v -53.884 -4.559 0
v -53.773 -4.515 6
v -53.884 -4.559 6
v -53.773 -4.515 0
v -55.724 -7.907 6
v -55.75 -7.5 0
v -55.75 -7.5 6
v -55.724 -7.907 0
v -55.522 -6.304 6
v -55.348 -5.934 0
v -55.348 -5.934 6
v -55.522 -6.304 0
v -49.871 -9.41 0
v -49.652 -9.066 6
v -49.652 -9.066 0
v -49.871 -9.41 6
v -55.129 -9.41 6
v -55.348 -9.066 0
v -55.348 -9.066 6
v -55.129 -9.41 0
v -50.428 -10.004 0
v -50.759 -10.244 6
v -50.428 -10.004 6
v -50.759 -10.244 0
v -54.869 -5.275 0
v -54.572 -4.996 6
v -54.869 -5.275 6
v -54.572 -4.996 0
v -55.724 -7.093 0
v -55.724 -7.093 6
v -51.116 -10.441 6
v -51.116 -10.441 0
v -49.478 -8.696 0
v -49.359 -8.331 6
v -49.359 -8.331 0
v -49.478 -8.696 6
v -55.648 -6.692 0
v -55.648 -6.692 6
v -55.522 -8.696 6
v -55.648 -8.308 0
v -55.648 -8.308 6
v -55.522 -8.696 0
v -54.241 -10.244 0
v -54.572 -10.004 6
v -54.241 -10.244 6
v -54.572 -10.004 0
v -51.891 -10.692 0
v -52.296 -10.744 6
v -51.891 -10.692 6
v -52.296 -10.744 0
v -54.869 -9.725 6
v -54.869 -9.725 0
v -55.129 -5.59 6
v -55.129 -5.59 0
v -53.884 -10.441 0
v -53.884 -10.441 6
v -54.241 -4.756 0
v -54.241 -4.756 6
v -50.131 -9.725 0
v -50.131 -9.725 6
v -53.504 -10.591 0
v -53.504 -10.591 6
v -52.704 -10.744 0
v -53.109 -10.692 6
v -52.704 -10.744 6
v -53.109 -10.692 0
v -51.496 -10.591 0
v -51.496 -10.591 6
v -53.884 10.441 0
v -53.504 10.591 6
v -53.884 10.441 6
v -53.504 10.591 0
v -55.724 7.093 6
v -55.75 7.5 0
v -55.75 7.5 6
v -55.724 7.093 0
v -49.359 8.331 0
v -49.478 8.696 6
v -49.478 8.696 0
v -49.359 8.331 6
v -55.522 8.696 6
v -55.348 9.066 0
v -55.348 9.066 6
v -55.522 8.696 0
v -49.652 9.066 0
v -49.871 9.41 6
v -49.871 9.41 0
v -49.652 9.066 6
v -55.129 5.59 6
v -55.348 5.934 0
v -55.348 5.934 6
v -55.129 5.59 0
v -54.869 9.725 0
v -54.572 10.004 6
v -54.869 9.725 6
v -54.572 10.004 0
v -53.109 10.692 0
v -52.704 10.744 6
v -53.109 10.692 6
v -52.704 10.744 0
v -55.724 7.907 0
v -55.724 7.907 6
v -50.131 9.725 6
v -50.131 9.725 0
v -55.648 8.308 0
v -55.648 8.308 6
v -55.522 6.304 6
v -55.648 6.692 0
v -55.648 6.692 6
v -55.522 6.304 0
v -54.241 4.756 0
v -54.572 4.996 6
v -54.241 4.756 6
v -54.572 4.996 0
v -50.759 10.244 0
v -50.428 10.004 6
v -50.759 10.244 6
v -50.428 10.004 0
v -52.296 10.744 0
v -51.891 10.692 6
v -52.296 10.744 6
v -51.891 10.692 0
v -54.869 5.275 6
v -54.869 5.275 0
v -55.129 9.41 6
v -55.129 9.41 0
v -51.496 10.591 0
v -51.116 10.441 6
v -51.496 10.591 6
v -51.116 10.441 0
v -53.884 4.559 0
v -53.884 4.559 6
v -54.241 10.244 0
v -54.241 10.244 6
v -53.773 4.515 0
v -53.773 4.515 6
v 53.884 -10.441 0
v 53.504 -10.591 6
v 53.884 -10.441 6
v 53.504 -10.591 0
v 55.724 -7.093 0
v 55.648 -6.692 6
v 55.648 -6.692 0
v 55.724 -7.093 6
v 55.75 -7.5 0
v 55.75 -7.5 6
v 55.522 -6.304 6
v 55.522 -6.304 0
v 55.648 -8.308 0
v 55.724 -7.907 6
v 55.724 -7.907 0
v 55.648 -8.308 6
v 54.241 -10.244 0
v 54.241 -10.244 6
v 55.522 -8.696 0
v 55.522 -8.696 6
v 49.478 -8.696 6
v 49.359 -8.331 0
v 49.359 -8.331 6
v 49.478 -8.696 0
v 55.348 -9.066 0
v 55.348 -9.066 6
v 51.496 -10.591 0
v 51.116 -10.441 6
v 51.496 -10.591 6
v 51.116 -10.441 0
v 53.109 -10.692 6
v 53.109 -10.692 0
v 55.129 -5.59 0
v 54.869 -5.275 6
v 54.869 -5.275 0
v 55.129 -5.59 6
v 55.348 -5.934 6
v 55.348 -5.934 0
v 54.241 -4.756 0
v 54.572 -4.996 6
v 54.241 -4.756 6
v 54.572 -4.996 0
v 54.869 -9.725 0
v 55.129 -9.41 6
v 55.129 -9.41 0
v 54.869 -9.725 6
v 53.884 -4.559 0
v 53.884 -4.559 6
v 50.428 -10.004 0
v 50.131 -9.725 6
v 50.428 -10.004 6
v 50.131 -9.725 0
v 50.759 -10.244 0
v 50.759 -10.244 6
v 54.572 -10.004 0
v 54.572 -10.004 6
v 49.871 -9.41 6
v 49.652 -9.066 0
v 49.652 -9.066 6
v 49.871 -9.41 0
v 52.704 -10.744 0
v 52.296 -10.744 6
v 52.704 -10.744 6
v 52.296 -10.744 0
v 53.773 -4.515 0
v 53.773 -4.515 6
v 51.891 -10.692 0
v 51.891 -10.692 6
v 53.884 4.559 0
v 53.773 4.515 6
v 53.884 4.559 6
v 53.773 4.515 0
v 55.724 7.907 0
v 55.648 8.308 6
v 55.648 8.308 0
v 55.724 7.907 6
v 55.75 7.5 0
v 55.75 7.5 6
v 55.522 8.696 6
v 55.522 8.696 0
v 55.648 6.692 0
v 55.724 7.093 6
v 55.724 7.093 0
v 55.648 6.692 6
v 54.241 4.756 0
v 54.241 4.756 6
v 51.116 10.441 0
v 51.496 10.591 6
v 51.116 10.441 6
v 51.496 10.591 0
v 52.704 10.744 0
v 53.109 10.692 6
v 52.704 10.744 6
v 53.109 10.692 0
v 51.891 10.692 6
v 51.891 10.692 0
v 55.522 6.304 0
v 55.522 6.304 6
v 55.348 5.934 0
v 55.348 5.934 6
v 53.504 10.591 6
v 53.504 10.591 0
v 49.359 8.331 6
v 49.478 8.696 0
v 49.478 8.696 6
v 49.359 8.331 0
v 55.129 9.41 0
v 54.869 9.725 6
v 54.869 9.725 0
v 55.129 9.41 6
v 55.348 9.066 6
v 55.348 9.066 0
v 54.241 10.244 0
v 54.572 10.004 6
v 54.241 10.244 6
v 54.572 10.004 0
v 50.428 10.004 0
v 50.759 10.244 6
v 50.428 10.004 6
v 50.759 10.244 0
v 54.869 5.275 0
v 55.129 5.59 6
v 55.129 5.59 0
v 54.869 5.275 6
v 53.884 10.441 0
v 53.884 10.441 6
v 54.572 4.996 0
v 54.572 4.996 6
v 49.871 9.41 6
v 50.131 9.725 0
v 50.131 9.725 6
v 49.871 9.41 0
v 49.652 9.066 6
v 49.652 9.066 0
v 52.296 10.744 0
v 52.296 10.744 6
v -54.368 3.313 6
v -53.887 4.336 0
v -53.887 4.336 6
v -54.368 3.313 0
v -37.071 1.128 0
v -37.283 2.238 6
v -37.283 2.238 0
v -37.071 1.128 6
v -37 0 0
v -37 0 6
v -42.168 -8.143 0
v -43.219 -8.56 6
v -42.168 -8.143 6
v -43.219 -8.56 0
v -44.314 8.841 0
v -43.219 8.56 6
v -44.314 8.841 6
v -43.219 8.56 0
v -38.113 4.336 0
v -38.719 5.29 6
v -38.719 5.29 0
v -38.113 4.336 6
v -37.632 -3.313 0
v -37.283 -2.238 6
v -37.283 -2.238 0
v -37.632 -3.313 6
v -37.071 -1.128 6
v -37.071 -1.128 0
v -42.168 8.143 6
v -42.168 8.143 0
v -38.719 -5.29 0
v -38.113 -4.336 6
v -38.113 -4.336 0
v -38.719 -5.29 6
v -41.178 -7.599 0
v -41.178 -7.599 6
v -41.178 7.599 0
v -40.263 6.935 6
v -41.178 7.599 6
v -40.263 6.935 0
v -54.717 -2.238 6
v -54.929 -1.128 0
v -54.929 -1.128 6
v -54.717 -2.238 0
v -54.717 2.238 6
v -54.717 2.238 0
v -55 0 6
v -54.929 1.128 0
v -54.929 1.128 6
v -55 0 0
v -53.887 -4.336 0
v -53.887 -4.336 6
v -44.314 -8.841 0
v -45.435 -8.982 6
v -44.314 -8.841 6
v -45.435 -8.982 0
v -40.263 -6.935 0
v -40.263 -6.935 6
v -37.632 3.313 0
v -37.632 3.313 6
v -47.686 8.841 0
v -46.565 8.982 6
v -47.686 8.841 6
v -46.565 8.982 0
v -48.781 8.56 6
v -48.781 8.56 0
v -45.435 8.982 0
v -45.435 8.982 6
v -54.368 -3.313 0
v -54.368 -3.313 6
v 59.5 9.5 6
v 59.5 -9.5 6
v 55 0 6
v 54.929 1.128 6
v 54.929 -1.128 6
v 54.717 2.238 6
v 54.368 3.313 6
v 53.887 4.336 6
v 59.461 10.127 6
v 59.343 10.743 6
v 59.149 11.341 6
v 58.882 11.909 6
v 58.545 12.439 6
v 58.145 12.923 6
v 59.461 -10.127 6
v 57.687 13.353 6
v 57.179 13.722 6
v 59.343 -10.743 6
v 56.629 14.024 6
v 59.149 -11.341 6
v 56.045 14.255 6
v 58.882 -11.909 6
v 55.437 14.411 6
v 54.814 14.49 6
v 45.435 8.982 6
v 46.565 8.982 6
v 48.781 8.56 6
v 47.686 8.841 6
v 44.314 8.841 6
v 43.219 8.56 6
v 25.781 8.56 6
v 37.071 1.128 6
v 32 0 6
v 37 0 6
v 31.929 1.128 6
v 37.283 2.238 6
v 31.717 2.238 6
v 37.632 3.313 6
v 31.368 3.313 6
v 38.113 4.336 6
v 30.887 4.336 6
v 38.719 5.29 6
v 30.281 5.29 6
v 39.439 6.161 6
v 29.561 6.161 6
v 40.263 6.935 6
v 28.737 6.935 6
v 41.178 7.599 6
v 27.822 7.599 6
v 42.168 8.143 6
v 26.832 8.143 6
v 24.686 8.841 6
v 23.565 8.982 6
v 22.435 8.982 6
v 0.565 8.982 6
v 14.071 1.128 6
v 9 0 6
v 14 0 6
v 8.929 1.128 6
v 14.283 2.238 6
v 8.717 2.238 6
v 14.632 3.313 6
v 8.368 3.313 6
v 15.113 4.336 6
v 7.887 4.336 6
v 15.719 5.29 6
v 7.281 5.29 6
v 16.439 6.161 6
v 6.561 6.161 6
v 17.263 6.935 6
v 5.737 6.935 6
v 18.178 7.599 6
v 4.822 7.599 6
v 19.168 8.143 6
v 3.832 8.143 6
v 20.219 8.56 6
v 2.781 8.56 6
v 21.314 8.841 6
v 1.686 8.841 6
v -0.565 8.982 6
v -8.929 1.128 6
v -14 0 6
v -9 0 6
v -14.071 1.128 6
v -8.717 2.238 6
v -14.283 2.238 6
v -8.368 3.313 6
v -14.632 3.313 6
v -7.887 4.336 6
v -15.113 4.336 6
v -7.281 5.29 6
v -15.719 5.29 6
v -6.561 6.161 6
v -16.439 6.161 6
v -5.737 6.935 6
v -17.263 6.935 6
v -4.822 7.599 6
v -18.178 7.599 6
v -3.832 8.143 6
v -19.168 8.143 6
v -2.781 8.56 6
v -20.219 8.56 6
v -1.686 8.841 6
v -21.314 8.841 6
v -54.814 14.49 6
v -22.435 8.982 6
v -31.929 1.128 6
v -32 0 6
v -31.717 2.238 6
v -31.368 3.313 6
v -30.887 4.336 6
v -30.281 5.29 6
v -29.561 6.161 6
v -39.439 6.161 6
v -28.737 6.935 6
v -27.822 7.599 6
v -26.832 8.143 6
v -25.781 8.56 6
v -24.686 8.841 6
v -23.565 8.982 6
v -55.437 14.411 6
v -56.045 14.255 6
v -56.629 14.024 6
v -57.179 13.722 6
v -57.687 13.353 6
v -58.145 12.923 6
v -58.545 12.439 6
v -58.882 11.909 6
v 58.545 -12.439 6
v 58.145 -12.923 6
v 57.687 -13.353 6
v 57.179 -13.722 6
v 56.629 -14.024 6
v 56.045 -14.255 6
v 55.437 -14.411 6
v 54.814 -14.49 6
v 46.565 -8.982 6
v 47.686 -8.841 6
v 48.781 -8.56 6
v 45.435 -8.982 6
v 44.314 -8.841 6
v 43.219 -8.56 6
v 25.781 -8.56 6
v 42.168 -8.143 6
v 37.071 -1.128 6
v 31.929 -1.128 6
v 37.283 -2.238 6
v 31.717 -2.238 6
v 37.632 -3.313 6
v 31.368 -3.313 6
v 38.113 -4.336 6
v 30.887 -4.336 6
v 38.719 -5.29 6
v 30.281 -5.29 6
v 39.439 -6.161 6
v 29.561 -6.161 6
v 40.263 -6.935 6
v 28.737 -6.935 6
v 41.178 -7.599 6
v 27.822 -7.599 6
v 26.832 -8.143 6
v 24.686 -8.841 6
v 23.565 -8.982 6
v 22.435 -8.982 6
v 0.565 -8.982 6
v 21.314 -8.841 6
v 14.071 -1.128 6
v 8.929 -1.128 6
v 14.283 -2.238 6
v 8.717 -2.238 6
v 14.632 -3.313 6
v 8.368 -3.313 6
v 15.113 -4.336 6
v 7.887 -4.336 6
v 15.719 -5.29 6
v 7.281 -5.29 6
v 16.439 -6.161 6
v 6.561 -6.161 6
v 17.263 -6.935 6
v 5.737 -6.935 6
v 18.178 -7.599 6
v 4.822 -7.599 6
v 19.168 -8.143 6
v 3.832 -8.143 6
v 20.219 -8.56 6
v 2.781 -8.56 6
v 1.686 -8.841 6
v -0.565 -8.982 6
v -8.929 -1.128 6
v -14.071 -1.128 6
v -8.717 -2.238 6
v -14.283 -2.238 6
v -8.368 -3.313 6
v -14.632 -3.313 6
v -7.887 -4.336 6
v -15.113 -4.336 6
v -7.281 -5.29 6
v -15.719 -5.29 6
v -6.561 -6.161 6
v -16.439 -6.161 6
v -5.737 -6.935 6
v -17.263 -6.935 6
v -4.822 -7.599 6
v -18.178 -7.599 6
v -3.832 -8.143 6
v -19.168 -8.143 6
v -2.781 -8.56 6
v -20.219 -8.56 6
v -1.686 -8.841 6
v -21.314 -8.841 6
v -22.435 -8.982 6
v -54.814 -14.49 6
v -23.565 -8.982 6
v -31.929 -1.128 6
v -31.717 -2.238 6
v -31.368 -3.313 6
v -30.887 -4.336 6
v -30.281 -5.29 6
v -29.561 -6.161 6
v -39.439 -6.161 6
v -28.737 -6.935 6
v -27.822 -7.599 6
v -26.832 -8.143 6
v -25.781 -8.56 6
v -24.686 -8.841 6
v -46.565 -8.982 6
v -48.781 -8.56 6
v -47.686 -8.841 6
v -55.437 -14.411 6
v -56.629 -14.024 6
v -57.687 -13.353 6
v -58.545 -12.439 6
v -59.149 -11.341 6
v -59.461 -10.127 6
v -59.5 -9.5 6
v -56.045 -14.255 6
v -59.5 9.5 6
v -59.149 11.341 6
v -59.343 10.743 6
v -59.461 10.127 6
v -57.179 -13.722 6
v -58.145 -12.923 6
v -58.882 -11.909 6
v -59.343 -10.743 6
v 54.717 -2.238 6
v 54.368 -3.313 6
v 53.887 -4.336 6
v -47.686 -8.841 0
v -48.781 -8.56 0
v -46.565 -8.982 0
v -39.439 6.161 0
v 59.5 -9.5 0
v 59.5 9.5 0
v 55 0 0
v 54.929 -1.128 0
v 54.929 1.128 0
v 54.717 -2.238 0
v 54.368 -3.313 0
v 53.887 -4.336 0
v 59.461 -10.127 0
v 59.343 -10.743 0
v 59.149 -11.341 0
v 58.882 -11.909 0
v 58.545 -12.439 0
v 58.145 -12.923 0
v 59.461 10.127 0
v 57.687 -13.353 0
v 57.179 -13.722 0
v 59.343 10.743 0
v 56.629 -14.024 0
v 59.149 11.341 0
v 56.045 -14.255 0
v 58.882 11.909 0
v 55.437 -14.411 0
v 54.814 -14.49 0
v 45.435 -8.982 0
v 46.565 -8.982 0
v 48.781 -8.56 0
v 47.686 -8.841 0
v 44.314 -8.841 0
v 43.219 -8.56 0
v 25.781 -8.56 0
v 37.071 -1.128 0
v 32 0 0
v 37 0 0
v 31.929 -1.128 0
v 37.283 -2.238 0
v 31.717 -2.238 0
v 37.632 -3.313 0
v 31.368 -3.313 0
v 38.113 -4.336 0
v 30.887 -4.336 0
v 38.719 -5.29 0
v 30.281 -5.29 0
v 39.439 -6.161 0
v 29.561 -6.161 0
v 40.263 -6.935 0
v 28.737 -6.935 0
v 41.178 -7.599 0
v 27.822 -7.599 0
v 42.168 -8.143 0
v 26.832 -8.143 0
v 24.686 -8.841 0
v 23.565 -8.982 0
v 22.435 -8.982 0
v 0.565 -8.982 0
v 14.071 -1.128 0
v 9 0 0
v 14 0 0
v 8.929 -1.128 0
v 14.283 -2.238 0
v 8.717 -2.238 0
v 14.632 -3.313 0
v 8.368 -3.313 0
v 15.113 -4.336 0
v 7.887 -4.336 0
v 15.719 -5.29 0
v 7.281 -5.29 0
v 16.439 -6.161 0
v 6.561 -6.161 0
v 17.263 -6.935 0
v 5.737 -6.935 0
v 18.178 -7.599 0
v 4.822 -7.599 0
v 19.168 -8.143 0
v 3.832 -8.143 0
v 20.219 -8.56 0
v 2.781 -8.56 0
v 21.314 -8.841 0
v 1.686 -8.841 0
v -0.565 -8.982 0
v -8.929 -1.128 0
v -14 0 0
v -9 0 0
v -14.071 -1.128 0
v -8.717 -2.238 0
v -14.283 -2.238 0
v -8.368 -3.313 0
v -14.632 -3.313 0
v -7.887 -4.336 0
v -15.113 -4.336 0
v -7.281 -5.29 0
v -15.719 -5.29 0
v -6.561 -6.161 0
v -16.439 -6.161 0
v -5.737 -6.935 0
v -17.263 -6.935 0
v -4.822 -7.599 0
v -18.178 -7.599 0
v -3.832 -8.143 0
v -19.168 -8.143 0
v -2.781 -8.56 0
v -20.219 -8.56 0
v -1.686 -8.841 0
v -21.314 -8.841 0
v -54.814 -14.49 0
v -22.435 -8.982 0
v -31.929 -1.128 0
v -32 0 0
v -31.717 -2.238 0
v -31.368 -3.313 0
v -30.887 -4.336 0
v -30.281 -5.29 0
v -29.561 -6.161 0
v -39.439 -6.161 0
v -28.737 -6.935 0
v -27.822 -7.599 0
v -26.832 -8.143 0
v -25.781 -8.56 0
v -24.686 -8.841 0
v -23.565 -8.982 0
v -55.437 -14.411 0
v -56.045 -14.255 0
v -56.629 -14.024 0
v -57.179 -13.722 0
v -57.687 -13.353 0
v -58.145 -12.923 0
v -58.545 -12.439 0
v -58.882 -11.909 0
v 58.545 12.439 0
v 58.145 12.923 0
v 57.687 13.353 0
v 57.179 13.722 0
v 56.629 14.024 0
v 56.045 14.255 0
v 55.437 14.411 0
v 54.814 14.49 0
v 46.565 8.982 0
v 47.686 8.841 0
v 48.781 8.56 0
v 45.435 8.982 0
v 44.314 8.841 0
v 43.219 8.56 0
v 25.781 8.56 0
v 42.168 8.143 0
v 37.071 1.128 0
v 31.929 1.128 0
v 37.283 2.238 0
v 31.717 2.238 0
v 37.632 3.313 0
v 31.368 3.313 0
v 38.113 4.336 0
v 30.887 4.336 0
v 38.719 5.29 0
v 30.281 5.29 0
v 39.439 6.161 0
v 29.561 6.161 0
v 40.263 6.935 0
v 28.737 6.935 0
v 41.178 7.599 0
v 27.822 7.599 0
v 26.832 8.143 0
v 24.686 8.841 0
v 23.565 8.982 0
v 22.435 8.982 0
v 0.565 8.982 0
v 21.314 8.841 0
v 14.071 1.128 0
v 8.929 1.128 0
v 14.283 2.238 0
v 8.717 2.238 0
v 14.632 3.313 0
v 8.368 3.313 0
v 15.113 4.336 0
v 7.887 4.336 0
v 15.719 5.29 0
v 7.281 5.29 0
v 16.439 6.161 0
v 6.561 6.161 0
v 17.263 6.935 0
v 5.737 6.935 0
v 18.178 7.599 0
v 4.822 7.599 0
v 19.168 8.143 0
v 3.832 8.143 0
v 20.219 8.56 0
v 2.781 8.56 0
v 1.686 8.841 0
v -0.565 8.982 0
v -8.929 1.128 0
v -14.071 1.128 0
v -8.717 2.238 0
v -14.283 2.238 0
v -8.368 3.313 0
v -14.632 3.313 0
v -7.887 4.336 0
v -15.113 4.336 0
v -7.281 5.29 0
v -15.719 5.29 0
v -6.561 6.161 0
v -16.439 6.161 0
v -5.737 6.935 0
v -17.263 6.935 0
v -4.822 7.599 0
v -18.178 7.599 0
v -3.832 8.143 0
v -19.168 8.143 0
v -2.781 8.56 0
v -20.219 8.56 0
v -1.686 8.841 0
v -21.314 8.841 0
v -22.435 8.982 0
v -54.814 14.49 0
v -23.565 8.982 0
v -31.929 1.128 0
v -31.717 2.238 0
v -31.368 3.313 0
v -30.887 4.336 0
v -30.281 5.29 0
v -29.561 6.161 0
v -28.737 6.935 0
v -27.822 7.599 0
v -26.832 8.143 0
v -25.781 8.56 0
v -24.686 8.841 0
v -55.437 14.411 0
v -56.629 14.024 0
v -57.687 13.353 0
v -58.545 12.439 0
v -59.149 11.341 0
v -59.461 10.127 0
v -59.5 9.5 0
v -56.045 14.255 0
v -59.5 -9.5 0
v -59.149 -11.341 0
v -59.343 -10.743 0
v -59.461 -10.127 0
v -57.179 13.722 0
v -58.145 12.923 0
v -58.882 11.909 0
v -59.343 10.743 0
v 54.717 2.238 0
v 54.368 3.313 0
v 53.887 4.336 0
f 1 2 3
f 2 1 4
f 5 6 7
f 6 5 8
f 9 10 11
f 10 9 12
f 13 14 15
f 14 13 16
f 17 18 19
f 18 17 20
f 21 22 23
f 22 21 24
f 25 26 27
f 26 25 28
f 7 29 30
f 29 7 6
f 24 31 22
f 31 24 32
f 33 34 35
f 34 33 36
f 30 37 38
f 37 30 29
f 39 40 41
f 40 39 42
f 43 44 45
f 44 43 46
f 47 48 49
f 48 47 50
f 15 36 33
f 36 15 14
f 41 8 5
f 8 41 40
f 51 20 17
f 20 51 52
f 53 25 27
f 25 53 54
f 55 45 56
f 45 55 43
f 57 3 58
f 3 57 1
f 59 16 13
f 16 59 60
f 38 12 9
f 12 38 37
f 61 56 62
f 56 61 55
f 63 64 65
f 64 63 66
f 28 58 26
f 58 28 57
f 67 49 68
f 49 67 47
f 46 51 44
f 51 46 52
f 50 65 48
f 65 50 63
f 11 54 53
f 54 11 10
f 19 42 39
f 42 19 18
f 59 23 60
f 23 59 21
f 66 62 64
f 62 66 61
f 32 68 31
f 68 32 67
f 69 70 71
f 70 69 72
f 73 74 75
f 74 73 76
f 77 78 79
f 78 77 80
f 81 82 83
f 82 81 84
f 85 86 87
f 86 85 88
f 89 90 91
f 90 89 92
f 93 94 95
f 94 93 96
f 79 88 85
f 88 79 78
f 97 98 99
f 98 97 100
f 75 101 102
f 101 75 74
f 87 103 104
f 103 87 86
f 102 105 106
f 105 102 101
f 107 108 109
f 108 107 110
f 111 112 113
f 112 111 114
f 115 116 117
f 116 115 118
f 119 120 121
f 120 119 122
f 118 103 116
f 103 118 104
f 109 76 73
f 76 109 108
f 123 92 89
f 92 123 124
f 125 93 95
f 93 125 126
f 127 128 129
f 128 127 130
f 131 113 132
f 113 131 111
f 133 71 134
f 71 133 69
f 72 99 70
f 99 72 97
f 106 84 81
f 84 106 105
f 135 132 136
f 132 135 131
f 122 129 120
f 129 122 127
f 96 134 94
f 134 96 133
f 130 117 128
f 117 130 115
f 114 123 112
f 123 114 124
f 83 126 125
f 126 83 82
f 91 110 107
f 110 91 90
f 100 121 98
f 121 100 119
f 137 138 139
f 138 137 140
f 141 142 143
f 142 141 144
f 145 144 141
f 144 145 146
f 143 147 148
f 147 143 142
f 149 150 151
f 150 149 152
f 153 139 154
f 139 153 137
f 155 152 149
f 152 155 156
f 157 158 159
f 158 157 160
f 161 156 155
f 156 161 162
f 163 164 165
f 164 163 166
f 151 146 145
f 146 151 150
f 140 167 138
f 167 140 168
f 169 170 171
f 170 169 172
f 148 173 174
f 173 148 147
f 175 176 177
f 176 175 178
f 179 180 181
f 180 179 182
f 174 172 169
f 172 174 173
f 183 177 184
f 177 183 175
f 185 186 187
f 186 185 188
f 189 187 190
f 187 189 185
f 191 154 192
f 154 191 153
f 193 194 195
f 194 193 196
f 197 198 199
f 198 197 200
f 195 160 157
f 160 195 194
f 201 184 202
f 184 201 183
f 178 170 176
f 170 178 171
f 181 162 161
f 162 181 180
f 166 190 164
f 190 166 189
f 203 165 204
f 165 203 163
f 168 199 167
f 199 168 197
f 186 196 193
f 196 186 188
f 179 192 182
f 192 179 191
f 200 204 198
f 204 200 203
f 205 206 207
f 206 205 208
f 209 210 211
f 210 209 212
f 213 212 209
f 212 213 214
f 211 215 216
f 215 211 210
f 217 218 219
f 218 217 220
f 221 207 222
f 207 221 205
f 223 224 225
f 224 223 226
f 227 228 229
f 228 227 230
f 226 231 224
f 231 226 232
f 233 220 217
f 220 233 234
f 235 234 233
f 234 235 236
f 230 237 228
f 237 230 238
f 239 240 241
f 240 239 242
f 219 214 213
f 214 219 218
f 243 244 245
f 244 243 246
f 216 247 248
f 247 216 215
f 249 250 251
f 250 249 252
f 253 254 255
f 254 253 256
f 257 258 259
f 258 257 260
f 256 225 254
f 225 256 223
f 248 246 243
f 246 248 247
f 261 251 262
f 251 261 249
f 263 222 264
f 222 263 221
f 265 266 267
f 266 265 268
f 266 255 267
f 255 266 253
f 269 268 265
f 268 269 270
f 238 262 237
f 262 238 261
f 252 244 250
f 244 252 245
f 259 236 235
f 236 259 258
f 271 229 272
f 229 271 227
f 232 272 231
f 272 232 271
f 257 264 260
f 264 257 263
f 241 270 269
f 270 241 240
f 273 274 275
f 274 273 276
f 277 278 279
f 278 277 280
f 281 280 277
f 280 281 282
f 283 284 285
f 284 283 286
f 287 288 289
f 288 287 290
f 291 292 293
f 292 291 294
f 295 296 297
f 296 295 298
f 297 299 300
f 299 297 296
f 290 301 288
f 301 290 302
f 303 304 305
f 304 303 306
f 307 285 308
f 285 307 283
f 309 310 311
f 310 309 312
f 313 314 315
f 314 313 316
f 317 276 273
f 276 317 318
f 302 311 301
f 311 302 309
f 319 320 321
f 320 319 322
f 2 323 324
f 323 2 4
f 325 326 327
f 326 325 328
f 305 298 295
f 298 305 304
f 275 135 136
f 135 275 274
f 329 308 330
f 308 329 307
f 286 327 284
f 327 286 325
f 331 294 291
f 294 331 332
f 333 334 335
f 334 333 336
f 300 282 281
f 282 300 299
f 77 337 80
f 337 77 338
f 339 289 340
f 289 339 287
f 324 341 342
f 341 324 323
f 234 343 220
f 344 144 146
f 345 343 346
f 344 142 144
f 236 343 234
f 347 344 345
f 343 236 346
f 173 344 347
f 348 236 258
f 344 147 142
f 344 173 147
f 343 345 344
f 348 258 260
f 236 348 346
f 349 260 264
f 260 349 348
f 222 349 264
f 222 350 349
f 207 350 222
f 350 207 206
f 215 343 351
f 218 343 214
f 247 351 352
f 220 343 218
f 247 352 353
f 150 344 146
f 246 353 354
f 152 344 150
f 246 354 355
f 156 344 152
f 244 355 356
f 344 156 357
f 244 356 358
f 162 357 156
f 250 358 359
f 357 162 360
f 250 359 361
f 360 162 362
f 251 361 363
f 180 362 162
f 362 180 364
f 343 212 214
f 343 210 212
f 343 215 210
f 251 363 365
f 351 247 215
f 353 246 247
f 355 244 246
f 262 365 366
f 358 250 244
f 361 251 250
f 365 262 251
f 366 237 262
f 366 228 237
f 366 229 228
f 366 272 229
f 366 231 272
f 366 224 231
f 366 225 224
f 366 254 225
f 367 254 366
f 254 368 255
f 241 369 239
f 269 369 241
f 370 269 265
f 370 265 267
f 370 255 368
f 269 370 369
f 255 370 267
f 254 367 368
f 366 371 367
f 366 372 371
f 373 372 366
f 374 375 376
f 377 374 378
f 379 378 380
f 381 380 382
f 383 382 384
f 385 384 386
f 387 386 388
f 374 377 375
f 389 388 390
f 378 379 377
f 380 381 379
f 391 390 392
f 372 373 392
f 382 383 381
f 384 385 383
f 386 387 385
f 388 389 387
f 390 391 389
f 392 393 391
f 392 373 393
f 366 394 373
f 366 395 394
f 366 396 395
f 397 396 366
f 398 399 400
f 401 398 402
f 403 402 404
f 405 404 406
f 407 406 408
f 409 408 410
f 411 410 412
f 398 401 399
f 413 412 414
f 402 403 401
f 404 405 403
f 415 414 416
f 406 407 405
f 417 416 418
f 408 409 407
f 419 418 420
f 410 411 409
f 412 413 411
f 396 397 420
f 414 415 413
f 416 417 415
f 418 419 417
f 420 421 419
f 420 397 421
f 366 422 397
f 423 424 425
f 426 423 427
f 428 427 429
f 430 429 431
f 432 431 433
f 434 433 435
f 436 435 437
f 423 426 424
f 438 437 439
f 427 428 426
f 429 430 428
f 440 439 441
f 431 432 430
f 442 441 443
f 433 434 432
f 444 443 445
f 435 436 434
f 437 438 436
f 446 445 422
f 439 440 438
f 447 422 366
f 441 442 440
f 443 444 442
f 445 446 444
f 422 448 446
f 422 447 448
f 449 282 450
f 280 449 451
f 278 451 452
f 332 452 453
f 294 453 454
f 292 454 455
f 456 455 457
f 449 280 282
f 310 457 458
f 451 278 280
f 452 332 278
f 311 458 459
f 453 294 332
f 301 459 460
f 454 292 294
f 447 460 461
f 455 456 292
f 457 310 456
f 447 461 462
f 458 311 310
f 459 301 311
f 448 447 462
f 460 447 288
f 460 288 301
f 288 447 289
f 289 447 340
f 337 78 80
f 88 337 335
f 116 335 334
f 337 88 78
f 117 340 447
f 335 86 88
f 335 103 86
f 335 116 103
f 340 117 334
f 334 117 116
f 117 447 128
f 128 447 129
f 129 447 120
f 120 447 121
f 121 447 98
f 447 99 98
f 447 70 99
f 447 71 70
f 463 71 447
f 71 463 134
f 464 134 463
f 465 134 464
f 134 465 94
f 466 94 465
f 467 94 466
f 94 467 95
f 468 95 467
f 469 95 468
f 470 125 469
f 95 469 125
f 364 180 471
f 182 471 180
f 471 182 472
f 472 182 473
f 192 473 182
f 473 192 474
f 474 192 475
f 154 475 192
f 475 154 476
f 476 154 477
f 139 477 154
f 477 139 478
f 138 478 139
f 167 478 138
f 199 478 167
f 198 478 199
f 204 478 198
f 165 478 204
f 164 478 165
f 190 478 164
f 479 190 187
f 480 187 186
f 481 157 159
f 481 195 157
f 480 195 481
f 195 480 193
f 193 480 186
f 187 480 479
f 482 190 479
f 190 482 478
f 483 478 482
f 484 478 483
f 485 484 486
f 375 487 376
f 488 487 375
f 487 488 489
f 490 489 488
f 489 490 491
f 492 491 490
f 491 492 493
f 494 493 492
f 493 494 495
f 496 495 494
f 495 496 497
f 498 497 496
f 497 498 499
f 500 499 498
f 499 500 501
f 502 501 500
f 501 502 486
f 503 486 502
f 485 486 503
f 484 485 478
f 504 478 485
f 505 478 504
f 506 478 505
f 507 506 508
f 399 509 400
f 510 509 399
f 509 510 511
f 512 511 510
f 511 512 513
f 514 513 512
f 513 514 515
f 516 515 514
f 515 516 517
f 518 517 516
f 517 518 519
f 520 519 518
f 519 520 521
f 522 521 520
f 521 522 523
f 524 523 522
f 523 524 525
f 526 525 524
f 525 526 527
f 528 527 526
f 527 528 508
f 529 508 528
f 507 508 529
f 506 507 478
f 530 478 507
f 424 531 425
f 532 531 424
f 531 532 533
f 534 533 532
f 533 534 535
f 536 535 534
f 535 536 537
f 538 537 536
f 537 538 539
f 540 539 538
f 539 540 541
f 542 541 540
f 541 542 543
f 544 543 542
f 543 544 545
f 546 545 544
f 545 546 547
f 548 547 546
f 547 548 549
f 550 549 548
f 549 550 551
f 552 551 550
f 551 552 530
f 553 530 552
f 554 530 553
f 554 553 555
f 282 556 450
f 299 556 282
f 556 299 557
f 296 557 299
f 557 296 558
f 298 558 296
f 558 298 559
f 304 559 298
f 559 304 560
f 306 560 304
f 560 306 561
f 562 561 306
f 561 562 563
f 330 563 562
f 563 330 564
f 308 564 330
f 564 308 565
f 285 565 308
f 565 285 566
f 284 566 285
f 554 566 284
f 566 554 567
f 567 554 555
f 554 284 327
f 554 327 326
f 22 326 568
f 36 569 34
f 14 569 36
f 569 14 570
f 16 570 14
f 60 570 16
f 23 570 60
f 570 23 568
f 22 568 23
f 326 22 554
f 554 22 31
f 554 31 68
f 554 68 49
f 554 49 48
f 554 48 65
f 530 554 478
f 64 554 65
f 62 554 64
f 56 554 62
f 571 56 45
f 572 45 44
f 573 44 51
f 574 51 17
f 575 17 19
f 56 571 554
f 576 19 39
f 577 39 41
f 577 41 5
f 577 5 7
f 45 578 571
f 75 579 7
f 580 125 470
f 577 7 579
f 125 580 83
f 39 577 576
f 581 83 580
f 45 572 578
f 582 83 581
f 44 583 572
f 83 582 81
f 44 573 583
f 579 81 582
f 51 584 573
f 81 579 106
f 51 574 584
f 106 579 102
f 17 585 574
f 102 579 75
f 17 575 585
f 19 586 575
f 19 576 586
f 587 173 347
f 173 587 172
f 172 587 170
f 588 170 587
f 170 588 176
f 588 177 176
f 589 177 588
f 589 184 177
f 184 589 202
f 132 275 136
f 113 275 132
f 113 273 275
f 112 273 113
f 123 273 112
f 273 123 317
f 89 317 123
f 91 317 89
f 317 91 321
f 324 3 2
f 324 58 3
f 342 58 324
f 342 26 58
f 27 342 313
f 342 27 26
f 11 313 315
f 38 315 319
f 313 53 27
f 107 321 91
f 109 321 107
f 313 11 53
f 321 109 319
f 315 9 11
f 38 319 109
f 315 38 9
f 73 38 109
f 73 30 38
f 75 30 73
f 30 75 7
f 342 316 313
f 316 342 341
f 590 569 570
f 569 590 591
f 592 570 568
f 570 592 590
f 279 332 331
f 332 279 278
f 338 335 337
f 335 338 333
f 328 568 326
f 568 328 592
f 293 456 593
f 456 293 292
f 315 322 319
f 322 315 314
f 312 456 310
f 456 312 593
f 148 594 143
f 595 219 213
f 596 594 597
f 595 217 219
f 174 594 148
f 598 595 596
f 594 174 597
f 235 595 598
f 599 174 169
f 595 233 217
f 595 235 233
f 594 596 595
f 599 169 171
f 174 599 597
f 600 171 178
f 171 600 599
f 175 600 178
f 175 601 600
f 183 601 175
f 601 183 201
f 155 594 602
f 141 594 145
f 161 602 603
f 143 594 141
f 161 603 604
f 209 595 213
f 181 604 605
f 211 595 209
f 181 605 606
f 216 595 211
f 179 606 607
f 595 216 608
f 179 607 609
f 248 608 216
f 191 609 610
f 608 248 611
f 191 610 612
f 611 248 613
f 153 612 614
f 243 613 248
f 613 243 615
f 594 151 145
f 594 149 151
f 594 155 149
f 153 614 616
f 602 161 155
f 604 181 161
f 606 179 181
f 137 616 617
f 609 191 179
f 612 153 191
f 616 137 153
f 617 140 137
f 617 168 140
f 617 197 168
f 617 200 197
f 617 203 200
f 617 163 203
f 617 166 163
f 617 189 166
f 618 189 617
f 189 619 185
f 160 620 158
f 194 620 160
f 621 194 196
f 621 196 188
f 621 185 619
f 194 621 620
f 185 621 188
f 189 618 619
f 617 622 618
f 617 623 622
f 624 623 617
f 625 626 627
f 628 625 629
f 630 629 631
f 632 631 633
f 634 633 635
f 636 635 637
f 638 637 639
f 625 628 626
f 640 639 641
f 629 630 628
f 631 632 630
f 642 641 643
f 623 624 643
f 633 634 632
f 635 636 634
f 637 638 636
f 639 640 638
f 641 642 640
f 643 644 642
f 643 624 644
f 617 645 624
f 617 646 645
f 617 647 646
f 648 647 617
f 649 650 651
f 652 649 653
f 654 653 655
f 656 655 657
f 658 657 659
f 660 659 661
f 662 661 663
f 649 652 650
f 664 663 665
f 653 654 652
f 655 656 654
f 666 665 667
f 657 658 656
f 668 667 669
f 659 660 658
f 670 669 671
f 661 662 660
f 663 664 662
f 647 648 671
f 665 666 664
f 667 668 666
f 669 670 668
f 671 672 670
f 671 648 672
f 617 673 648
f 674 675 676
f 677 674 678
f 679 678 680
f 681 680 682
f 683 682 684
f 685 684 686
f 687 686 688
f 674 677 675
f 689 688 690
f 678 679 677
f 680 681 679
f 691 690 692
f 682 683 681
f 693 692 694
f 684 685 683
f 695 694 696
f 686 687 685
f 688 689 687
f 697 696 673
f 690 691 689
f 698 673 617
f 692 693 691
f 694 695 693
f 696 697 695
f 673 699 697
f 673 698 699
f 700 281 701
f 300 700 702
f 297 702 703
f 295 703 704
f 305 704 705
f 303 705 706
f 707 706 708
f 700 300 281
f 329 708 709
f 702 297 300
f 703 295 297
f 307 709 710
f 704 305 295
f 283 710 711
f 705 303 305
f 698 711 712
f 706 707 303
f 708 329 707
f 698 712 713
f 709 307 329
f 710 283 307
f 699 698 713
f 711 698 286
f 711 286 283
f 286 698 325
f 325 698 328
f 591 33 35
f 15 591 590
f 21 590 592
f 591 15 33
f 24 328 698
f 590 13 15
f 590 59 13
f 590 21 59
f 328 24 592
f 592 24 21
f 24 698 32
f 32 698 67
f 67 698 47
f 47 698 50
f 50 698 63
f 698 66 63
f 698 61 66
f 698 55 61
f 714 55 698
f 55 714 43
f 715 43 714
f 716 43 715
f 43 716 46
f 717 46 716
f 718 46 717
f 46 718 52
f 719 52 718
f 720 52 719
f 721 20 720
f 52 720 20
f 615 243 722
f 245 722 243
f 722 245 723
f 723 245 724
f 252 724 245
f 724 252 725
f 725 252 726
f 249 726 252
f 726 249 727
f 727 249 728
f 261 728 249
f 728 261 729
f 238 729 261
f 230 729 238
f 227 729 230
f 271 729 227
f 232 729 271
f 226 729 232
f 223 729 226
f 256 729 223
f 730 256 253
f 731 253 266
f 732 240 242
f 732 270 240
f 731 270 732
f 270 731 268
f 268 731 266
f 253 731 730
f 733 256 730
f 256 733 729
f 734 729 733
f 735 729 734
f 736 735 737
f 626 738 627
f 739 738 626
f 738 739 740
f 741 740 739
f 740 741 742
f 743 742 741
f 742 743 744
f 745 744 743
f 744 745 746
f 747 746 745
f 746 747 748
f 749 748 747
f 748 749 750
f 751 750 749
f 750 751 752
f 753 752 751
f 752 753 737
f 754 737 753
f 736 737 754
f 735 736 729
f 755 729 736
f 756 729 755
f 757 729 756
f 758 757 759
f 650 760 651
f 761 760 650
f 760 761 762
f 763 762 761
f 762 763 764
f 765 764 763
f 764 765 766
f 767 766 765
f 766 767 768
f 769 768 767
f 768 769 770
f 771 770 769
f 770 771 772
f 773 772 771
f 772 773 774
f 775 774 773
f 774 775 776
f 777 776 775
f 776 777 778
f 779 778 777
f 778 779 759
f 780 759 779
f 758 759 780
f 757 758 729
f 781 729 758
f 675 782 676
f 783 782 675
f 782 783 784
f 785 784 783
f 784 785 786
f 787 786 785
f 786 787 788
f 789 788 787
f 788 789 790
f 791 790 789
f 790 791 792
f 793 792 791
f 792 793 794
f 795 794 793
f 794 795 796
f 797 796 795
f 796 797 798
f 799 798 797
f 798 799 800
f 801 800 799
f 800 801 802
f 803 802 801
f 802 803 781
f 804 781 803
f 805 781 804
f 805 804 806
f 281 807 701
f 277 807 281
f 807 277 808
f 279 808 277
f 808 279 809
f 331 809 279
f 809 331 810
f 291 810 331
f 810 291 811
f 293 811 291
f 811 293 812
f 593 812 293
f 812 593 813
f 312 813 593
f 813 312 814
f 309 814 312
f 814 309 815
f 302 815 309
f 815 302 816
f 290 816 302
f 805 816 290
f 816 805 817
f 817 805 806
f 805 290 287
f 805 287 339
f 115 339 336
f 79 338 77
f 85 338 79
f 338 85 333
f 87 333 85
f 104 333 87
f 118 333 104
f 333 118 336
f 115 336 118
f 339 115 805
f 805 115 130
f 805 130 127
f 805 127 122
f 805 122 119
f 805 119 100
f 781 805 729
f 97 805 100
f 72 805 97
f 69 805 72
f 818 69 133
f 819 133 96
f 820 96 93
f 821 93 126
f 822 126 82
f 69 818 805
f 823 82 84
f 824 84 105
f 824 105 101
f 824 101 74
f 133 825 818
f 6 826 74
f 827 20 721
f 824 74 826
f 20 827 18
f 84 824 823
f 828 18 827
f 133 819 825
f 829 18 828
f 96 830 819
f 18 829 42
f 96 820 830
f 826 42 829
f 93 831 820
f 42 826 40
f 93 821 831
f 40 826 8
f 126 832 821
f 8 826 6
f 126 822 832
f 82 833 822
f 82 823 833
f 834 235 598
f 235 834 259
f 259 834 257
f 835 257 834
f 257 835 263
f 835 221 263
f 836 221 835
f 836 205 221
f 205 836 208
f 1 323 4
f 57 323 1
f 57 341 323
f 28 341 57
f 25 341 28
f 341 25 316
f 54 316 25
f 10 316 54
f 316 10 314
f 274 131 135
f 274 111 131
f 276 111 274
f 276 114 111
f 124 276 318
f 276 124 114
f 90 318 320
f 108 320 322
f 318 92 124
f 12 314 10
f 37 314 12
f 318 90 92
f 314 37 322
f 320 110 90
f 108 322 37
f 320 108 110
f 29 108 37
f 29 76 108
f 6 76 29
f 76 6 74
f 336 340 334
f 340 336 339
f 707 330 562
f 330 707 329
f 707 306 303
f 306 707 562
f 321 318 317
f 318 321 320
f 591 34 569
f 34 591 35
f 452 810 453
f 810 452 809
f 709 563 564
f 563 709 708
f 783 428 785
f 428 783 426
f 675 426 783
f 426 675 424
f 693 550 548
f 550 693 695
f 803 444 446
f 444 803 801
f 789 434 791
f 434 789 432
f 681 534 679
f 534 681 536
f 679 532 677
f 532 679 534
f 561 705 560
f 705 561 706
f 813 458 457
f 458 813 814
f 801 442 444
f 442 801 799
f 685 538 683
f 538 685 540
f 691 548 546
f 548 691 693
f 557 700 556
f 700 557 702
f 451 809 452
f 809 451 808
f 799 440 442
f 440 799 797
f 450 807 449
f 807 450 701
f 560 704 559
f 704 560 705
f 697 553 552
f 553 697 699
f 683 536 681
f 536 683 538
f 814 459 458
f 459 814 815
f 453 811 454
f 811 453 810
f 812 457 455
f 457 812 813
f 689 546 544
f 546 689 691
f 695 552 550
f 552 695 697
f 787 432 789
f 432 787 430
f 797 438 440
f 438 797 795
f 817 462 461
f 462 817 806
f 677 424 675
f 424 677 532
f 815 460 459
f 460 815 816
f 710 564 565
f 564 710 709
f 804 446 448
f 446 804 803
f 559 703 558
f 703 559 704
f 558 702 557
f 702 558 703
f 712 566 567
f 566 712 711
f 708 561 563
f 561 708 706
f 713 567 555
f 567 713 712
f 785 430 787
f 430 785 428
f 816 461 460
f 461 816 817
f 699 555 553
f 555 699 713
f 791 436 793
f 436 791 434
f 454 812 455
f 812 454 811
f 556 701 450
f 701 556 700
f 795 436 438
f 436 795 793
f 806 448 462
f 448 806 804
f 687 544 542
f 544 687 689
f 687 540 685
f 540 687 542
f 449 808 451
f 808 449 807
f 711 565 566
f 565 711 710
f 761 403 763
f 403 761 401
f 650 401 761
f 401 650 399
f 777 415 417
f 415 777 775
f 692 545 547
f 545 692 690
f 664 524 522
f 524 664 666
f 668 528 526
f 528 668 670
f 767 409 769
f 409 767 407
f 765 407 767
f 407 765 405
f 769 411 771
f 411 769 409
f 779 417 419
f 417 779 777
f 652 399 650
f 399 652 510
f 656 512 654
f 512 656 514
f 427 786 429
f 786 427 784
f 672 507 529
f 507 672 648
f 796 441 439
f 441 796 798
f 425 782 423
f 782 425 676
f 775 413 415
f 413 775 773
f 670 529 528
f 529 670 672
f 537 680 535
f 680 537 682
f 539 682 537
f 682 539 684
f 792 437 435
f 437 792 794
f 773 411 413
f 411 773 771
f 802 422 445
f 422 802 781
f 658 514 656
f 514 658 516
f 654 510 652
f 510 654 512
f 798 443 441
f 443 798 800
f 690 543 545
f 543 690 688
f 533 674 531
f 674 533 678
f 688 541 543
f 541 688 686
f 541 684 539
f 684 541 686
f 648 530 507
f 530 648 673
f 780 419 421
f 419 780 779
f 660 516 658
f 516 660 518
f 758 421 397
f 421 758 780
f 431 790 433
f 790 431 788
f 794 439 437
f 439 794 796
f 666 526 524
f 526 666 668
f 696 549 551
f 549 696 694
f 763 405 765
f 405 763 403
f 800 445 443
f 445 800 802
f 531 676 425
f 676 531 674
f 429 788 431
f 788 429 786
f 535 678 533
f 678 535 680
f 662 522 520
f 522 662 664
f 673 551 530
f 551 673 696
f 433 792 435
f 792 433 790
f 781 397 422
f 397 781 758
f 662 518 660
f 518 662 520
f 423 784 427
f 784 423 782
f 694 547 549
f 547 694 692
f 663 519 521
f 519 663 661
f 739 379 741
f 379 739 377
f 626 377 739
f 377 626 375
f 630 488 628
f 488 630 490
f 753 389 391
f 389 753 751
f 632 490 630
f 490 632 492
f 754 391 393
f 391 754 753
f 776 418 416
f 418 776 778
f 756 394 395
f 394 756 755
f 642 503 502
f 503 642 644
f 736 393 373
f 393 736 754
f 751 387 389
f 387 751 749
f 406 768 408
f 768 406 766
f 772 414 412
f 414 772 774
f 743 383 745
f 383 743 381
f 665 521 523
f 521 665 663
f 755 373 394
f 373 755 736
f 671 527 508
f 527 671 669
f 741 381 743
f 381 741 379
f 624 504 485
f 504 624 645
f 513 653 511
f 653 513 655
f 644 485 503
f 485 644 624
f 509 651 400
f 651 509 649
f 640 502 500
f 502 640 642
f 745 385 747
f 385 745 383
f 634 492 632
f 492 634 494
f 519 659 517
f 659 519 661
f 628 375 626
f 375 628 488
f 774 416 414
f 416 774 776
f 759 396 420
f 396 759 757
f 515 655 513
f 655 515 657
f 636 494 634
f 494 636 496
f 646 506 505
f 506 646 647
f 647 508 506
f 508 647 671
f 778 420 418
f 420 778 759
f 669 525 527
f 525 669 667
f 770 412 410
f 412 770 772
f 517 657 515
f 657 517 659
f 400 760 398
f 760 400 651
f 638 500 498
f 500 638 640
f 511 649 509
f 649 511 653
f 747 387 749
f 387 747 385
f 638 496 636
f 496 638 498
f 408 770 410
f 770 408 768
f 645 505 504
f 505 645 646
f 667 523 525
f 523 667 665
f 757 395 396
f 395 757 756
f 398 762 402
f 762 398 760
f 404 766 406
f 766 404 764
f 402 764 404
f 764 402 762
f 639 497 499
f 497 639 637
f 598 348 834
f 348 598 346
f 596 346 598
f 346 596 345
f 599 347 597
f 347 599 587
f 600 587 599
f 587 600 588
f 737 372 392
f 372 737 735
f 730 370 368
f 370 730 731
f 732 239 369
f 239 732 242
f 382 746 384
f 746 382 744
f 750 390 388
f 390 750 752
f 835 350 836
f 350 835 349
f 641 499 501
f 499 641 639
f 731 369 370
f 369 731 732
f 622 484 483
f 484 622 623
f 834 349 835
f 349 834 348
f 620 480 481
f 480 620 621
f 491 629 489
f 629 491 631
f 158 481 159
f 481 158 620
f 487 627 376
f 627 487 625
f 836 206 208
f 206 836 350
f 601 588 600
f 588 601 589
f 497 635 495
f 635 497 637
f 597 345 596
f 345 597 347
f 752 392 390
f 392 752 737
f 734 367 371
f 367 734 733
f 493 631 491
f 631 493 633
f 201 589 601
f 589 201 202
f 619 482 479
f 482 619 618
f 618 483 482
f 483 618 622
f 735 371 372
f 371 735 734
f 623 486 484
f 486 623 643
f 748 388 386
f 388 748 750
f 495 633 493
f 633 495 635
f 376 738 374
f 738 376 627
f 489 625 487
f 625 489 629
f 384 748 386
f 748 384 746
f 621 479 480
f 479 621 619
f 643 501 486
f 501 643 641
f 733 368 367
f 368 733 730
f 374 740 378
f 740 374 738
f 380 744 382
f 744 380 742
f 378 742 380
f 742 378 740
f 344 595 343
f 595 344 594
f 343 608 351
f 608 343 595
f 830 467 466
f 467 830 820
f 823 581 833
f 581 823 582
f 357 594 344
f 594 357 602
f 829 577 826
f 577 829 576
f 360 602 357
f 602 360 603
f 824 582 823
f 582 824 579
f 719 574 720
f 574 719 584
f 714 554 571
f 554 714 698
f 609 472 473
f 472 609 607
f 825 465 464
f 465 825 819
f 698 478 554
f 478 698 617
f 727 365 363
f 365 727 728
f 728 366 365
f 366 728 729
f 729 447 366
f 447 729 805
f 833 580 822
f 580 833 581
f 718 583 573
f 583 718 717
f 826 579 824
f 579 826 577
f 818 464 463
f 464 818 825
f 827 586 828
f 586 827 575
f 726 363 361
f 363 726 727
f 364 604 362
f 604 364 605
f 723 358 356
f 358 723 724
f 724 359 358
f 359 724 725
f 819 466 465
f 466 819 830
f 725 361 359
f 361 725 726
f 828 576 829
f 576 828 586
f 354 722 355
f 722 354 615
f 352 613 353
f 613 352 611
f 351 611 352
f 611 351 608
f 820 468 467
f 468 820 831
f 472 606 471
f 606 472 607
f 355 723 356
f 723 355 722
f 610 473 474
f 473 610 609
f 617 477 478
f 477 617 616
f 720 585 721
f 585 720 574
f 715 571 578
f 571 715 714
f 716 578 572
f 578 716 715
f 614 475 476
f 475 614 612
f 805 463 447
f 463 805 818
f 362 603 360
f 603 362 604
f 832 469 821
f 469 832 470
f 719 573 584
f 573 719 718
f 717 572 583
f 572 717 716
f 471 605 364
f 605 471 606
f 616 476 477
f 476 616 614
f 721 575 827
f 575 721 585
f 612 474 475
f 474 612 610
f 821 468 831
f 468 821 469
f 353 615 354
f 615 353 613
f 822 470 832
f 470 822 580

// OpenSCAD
$fn = 50;

difference() {
	union() {
		hull() {
			translate(v = [-54.5, 9.5, 0]) {
				cylinder(h = 6, r = 5);
			}
			translate(v = [54.5, 9.5, 0]) {
				cylinder(h = 6, r = 5);
			}
			translate(v = [-54.5, -9.5, 0]) {
				cylinder(h = 6, r = 5);
			}
			translate(v = [54.5, -9.5, 0]) {
				cylinder(h = 6, r = 5);
			}
		}
	}
	union() {
		translate(v = [-52.5, -7.5, -100.0]) {
			cylinder(h = 200, r = 3.25);
		}
		translate(v = [-52.5, 7.5, -100.0]) {
			cylinder(h = 200, r = 3.25);
		}
		translate(v = [52.5, -7.5, -100.0]) {
			cylinder(h = 200, r = 3.25);
		}
		translate(v = [52.5, 7.5, -100.0]) {
			cylinder(h = 200, r = 3.25);
		}
		translate(v = [-52.5, -7.5, -100.0]) {
			cylinder(h = 200, r = 1.8);
		}
		translate(v = [-52.5, 7.5, -100.0]) {
			cylinder(h = 200, r = 1.8);
		}
		translate(v = [52.5, -7.5, -100.0]) {
			cylinder(h = 200, r = 1.8);
		}
		translate(v = [52.5, 7.5, -100.0]) {
			cylinder(h = 200, r = 1.8);
		}
		translate(v = [-46.0, 0, 0.0]) {
			cylinder(h = 6, r = 9.0);
		}
		translate(v = [-23.0, 0, 0.0]) {
			cylinder(h = 6, r = 9.0);
		}
		cylinder(h = 6, r = 9.0);
		translate(v = [23.0, 0, 0.0]) {
			cylinder(h = 6, r = 9.0);
		}
		translate(v = [46.0, 0, 0.0]) {
			cylinder(h = 6, r = 9.0);
		}
	}
}
